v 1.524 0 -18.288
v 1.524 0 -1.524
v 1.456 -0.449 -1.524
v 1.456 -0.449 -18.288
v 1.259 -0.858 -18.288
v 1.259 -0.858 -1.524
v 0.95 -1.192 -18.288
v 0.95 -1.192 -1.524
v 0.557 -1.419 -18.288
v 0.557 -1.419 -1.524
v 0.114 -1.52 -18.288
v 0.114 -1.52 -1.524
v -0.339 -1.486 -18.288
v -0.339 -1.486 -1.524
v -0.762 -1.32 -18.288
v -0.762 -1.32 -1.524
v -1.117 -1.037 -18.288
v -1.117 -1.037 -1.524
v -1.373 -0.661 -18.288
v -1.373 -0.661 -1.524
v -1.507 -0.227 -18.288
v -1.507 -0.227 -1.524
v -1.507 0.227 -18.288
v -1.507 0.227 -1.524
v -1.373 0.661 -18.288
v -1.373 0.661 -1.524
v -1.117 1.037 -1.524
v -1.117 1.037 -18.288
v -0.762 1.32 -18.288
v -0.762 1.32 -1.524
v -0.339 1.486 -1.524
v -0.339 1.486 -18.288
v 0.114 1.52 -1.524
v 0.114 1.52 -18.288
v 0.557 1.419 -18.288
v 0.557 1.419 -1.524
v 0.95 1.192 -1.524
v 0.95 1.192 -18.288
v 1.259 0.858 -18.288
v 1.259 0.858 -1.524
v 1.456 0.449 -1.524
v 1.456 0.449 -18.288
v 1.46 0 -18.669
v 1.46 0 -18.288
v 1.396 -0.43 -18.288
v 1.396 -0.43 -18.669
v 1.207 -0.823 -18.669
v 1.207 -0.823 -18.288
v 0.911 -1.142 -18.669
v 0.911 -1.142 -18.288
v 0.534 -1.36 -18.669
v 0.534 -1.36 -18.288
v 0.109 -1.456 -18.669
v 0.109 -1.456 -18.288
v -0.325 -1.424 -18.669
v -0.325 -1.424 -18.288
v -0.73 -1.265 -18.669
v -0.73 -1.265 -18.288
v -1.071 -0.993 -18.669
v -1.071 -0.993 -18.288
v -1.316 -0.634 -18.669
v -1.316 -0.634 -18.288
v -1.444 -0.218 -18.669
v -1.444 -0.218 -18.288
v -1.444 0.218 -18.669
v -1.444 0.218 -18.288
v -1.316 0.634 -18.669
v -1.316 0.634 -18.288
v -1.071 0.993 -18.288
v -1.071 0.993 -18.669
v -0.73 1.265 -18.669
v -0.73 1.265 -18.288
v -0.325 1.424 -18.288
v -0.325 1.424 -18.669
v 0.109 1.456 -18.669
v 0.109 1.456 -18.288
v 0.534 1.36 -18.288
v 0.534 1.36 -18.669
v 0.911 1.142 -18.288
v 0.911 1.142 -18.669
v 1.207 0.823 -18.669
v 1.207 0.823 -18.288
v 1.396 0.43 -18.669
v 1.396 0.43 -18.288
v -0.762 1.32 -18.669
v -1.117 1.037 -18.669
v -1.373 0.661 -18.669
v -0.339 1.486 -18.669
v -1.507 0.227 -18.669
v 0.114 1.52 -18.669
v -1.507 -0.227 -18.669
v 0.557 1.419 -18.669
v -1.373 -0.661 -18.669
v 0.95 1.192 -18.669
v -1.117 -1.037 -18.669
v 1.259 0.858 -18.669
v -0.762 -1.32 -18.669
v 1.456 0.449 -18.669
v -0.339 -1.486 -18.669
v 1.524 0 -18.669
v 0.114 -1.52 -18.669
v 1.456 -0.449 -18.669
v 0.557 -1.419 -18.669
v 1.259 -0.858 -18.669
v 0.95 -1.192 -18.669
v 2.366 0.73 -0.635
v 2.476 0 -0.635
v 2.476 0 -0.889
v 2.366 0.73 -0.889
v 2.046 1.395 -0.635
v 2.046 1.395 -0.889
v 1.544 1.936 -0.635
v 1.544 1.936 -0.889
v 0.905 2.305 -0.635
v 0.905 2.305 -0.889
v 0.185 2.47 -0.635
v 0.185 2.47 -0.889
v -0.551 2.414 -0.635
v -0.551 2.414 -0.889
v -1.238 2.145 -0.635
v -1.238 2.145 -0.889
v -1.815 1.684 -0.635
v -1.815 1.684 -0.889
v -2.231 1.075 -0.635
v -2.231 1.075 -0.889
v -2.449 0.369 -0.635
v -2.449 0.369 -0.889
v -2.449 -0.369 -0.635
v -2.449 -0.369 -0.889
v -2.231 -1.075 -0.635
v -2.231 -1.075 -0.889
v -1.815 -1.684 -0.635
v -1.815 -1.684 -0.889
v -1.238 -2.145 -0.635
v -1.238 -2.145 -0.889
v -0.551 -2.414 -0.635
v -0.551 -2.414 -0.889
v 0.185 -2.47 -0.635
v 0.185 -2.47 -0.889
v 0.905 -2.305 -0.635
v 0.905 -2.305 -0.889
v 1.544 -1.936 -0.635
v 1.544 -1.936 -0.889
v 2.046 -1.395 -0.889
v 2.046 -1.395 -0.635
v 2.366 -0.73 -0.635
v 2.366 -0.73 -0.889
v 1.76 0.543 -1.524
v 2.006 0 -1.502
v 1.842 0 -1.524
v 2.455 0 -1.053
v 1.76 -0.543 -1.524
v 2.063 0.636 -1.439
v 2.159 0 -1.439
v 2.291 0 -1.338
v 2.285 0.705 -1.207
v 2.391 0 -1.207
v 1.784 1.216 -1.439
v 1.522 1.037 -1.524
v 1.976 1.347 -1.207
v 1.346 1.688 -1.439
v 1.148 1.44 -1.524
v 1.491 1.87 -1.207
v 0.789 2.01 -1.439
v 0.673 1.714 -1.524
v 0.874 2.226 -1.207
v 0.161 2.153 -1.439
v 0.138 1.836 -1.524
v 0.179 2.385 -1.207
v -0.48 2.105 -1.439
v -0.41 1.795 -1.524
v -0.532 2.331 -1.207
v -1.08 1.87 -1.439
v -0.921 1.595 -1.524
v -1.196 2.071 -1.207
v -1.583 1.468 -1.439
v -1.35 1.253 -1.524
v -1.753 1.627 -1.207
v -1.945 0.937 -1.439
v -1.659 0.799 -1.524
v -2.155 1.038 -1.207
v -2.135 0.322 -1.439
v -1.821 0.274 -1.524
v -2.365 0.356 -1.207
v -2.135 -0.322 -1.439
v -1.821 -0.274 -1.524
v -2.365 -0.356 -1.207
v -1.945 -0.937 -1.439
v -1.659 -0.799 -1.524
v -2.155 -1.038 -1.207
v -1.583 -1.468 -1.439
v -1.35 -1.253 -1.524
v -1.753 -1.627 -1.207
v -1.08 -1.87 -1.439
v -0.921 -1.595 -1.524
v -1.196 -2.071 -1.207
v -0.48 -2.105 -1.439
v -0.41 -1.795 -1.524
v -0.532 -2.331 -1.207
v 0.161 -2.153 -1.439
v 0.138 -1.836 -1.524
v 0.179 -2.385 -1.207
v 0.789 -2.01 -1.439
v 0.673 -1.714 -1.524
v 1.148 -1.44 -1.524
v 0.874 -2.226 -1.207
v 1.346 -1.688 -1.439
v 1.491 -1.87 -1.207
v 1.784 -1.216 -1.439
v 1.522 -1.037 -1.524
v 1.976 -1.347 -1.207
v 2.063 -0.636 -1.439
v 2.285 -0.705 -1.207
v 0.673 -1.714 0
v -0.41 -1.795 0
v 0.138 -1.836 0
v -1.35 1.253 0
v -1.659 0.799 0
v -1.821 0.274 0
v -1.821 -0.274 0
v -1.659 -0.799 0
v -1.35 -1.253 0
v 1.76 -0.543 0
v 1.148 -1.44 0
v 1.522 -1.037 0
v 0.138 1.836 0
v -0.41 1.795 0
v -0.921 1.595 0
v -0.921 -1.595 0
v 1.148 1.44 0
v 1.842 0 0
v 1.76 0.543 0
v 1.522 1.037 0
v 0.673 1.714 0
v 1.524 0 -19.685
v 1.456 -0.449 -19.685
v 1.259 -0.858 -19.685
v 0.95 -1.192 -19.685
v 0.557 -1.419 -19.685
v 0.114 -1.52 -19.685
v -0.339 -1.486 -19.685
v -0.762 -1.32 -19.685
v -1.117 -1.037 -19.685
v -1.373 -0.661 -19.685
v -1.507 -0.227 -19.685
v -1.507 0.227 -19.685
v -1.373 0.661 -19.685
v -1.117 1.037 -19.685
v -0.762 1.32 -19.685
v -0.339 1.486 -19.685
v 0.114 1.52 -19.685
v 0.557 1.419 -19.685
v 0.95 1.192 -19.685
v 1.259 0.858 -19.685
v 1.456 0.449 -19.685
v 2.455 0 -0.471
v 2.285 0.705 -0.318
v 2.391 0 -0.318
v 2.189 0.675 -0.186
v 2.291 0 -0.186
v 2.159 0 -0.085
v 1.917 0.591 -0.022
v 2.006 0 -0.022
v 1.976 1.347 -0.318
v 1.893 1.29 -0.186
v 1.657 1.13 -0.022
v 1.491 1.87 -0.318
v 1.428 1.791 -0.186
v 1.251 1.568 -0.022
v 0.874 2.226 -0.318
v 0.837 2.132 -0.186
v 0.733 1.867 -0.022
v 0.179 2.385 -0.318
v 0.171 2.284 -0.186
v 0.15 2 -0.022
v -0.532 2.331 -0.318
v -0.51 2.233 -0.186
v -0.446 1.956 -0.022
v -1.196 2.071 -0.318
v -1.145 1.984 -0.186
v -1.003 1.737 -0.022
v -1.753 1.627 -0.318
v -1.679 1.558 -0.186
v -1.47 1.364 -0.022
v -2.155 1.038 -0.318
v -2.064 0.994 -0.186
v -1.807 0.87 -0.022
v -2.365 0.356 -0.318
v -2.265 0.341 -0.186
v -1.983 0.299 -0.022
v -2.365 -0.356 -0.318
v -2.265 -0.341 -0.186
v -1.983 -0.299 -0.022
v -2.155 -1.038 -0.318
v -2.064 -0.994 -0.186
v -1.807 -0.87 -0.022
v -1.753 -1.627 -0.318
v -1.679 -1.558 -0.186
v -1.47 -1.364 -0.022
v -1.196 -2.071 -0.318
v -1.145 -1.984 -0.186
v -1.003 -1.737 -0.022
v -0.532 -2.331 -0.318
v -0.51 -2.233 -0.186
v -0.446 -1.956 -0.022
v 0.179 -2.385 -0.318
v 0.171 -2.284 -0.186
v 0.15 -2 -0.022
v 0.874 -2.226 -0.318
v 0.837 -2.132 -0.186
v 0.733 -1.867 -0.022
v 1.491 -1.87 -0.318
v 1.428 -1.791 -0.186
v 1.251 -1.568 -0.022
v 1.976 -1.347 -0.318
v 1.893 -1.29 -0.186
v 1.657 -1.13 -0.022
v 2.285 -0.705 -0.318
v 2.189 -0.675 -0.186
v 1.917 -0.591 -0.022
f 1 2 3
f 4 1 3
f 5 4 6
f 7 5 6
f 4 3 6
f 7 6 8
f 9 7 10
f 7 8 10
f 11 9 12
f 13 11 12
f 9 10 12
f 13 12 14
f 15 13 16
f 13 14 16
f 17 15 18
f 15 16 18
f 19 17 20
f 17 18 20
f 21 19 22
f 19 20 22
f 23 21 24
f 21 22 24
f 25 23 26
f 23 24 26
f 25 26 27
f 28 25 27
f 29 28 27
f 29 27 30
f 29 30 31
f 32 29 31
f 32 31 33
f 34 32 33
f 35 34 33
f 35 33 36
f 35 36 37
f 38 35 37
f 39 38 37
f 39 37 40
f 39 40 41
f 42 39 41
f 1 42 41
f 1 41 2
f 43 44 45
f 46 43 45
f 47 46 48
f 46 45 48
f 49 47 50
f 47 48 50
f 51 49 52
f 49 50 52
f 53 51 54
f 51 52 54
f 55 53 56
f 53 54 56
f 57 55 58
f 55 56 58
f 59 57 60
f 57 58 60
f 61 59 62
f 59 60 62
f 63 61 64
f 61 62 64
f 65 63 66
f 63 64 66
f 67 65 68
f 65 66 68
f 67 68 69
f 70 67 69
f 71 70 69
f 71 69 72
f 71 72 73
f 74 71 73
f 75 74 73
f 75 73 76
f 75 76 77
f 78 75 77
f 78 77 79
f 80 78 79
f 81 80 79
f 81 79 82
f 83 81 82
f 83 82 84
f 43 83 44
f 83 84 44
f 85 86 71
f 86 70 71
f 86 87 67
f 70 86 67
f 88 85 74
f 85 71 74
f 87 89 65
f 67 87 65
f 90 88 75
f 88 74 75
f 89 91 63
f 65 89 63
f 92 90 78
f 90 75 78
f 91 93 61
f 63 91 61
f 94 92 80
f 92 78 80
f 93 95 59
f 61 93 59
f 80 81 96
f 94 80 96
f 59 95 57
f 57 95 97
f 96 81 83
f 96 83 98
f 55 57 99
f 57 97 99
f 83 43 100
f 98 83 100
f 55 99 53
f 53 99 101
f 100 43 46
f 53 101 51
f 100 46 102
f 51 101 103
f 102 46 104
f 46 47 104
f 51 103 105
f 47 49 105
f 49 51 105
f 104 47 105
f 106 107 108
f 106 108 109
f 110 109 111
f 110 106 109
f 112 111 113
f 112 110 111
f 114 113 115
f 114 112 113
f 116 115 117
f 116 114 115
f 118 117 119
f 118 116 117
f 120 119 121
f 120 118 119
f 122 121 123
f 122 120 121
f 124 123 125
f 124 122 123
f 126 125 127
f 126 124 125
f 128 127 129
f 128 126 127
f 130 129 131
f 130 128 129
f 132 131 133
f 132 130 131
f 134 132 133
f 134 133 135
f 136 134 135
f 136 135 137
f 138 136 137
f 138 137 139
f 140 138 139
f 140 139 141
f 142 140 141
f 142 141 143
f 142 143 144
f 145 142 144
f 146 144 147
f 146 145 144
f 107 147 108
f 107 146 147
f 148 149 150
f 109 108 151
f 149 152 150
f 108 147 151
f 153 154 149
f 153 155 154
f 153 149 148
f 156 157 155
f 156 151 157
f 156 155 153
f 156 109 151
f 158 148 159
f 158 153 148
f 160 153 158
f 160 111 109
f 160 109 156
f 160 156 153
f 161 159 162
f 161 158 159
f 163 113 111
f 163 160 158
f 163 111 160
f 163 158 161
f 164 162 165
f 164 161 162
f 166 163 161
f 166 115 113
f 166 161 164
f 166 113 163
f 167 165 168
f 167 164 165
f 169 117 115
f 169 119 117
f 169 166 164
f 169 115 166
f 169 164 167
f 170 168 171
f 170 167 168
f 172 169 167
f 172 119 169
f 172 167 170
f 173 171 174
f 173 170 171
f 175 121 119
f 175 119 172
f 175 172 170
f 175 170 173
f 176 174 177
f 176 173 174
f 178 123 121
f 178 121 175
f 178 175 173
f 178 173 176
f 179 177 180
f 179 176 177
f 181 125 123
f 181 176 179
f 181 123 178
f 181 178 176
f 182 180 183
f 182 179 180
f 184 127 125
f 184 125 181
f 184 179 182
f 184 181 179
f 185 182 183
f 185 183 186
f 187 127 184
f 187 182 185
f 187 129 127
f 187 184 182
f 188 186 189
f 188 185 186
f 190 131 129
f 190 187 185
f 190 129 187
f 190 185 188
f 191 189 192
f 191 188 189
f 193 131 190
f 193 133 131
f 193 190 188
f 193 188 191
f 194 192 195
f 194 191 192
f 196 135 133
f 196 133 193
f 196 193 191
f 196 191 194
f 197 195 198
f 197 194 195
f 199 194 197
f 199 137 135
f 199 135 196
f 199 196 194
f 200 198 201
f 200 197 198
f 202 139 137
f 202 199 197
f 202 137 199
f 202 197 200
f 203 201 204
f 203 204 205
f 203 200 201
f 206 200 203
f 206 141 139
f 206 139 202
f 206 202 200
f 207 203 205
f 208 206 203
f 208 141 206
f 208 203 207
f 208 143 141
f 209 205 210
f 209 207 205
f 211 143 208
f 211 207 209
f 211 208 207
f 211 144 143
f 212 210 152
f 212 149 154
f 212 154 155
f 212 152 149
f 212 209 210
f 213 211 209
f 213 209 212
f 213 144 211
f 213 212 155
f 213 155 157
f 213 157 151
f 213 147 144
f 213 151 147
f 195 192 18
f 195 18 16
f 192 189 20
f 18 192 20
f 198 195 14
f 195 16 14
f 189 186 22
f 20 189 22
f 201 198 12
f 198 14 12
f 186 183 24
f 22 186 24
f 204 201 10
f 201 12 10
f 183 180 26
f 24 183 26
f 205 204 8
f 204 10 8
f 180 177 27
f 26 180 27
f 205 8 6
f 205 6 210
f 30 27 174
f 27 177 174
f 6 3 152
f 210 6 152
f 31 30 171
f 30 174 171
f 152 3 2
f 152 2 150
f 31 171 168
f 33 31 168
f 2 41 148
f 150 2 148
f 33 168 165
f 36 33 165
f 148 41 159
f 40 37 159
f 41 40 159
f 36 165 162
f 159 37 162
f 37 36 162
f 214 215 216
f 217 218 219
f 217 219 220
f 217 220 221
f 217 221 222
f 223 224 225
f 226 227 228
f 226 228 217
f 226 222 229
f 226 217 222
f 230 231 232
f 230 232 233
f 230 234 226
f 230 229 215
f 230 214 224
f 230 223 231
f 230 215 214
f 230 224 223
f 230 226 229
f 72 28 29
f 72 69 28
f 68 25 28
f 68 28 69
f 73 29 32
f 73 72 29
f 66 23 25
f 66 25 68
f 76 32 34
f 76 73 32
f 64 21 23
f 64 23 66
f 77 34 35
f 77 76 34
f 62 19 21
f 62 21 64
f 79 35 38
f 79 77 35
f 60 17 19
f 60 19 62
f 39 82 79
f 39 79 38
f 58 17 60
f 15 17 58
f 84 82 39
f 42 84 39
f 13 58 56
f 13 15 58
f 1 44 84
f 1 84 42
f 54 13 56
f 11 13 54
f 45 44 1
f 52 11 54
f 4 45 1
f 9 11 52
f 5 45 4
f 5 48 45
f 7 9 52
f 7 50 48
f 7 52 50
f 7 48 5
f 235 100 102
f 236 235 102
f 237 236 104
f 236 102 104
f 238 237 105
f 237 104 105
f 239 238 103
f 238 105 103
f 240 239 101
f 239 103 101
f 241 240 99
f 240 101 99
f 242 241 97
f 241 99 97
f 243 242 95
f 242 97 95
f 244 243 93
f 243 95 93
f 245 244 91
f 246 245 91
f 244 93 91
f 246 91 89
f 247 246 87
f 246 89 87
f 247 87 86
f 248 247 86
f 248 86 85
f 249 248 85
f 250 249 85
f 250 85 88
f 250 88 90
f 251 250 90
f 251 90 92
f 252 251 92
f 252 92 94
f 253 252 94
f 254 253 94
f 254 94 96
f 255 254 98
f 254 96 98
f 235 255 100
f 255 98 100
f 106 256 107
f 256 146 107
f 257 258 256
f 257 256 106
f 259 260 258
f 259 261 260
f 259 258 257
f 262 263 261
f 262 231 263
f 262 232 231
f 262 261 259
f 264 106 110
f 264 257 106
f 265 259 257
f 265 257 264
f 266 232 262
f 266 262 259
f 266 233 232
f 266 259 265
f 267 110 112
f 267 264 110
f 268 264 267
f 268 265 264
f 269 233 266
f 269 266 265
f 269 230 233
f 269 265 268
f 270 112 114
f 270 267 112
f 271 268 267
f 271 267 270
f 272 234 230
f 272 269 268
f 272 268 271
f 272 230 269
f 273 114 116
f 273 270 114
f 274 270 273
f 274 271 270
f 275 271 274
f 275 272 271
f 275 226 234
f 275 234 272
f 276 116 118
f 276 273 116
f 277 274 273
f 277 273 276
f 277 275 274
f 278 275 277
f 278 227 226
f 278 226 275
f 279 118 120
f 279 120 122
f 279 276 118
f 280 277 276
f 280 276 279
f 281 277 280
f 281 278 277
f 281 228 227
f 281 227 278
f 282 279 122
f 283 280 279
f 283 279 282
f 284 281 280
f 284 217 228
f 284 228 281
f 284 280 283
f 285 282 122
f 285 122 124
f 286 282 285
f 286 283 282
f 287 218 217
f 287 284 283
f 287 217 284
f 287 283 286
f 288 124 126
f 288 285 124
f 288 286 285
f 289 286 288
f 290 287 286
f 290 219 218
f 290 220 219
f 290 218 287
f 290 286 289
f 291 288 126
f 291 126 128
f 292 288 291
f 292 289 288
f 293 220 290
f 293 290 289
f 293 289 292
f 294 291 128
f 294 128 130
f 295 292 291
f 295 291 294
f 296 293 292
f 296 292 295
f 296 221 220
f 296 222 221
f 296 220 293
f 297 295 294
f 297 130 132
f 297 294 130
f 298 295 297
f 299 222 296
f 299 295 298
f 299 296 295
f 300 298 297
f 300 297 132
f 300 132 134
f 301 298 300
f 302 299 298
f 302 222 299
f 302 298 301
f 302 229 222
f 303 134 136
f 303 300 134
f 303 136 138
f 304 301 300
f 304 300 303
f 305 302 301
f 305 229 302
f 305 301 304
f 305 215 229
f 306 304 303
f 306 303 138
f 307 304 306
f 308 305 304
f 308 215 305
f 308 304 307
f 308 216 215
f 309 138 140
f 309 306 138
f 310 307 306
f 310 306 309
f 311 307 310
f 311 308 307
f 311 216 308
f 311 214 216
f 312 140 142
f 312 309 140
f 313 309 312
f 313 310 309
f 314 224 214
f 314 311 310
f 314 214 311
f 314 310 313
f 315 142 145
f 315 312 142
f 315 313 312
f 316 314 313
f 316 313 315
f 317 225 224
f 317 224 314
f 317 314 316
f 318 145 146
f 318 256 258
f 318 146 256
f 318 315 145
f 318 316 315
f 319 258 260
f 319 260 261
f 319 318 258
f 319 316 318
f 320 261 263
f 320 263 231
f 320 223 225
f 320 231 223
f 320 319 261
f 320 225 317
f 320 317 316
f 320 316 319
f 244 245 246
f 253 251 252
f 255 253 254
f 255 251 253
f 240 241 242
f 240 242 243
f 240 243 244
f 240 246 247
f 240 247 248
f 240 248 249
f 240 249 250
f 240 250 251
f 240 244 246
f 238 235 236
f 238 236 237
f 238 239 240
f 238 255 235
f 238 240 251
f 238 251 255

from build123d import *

# Parameters (mm, degrees)
SKETCH1_R           = 2.4765
BOSS_EXTRUDE1_DEPTH = 1.524
SKETCH2_R           = 1.524
BOSS_EXTRUDE2_DEPTH = 18.161
CUT_EXTRUDE1_START  = -1.397
SKETCH4_R           = 1.524
CUT_EXTRUDE1_DEPTH  = 1.397
SKETCH5_R           = 1.4605
BOSS_EXTRUDE3_DEPTH = 0.381
SKETCH6_R           = 1.524
BOSS_EXTRUDE4_DEPTH = 1.016
FILLET1_R           = 0.635


with BuildPart() as part:
    # Sketch1 → Boss-Extrude1 (new body)
    with BuildSketch(Plane.XY):
        Circle(SKETCH1_R)
    extrude(amount=-BOSS_EXTRUDE1_DEPTH)

    # Sketch2 → Boss-Extrude2 (add)
    with BuildSketch(Plane(origin=(0, 0, -1.524), x_dir=(-1, 0, 0), z_dir=(0, 0, -1))):
        with Locations(Location((0, 0, 0), (0, 0, 180))):
            Circle(SKETCH2_R)
    extrude(amount=BOSS_EXTRUDE2_DEPTH)

    # Sketch4 → Cut-Extrude1 (cut)
    with BuildSketch(Plane(origin=(0, 0, -19.685), x_dir=(-1, 0, 0), z_dir=(0, 0, -1)).offset(CUT_EXTRUDE1_START)):
        with Locations(Location((0, 0, 0), (0, 0, 180))):
            Circle(SKETCH4_R)
    extrude(amount=CUT_EXTRUDE1_DEPTH, mode=Mode.SUBTRACT)

    # Sketch5 → Boss-Extrude3 (add)
    with BuildSketch(Plane(origin=(0, 0, -18.288), x_dir=(-1, 0, 0), z_dir=(0, 0, -1))):
        with Locations(Location((0, 0, 0), (0, 0, 180))):
            Circle(SKETCH5_R)
    extrude(amount=BOSS_EXTRUDE3_DEPTH)

    # Sketch6 → Boss-Extrude4 (add)
    with BuildSketch(Plane(origin=(0, 0, -18.669), x_dir=(-1, 0, 0), z_dir=(0, 0, -1))):
        with Locations(Location((0, 0, 0), (0, 0, 180))):
            Circle(SKETCH6_R)
    extrude(amount=BOSS_EXTRUDE4_DEPTH)

    # Fillet1
    fillet1_edges = [part.edges().sort_by_distance(p)[0] for p in [
        (-2.4765, 0, 0),
        (-2.4765, 0, -1.524),
    ]]
    fillet(fillet1_edges, radius=FILLET1_R)


solid = part.part
